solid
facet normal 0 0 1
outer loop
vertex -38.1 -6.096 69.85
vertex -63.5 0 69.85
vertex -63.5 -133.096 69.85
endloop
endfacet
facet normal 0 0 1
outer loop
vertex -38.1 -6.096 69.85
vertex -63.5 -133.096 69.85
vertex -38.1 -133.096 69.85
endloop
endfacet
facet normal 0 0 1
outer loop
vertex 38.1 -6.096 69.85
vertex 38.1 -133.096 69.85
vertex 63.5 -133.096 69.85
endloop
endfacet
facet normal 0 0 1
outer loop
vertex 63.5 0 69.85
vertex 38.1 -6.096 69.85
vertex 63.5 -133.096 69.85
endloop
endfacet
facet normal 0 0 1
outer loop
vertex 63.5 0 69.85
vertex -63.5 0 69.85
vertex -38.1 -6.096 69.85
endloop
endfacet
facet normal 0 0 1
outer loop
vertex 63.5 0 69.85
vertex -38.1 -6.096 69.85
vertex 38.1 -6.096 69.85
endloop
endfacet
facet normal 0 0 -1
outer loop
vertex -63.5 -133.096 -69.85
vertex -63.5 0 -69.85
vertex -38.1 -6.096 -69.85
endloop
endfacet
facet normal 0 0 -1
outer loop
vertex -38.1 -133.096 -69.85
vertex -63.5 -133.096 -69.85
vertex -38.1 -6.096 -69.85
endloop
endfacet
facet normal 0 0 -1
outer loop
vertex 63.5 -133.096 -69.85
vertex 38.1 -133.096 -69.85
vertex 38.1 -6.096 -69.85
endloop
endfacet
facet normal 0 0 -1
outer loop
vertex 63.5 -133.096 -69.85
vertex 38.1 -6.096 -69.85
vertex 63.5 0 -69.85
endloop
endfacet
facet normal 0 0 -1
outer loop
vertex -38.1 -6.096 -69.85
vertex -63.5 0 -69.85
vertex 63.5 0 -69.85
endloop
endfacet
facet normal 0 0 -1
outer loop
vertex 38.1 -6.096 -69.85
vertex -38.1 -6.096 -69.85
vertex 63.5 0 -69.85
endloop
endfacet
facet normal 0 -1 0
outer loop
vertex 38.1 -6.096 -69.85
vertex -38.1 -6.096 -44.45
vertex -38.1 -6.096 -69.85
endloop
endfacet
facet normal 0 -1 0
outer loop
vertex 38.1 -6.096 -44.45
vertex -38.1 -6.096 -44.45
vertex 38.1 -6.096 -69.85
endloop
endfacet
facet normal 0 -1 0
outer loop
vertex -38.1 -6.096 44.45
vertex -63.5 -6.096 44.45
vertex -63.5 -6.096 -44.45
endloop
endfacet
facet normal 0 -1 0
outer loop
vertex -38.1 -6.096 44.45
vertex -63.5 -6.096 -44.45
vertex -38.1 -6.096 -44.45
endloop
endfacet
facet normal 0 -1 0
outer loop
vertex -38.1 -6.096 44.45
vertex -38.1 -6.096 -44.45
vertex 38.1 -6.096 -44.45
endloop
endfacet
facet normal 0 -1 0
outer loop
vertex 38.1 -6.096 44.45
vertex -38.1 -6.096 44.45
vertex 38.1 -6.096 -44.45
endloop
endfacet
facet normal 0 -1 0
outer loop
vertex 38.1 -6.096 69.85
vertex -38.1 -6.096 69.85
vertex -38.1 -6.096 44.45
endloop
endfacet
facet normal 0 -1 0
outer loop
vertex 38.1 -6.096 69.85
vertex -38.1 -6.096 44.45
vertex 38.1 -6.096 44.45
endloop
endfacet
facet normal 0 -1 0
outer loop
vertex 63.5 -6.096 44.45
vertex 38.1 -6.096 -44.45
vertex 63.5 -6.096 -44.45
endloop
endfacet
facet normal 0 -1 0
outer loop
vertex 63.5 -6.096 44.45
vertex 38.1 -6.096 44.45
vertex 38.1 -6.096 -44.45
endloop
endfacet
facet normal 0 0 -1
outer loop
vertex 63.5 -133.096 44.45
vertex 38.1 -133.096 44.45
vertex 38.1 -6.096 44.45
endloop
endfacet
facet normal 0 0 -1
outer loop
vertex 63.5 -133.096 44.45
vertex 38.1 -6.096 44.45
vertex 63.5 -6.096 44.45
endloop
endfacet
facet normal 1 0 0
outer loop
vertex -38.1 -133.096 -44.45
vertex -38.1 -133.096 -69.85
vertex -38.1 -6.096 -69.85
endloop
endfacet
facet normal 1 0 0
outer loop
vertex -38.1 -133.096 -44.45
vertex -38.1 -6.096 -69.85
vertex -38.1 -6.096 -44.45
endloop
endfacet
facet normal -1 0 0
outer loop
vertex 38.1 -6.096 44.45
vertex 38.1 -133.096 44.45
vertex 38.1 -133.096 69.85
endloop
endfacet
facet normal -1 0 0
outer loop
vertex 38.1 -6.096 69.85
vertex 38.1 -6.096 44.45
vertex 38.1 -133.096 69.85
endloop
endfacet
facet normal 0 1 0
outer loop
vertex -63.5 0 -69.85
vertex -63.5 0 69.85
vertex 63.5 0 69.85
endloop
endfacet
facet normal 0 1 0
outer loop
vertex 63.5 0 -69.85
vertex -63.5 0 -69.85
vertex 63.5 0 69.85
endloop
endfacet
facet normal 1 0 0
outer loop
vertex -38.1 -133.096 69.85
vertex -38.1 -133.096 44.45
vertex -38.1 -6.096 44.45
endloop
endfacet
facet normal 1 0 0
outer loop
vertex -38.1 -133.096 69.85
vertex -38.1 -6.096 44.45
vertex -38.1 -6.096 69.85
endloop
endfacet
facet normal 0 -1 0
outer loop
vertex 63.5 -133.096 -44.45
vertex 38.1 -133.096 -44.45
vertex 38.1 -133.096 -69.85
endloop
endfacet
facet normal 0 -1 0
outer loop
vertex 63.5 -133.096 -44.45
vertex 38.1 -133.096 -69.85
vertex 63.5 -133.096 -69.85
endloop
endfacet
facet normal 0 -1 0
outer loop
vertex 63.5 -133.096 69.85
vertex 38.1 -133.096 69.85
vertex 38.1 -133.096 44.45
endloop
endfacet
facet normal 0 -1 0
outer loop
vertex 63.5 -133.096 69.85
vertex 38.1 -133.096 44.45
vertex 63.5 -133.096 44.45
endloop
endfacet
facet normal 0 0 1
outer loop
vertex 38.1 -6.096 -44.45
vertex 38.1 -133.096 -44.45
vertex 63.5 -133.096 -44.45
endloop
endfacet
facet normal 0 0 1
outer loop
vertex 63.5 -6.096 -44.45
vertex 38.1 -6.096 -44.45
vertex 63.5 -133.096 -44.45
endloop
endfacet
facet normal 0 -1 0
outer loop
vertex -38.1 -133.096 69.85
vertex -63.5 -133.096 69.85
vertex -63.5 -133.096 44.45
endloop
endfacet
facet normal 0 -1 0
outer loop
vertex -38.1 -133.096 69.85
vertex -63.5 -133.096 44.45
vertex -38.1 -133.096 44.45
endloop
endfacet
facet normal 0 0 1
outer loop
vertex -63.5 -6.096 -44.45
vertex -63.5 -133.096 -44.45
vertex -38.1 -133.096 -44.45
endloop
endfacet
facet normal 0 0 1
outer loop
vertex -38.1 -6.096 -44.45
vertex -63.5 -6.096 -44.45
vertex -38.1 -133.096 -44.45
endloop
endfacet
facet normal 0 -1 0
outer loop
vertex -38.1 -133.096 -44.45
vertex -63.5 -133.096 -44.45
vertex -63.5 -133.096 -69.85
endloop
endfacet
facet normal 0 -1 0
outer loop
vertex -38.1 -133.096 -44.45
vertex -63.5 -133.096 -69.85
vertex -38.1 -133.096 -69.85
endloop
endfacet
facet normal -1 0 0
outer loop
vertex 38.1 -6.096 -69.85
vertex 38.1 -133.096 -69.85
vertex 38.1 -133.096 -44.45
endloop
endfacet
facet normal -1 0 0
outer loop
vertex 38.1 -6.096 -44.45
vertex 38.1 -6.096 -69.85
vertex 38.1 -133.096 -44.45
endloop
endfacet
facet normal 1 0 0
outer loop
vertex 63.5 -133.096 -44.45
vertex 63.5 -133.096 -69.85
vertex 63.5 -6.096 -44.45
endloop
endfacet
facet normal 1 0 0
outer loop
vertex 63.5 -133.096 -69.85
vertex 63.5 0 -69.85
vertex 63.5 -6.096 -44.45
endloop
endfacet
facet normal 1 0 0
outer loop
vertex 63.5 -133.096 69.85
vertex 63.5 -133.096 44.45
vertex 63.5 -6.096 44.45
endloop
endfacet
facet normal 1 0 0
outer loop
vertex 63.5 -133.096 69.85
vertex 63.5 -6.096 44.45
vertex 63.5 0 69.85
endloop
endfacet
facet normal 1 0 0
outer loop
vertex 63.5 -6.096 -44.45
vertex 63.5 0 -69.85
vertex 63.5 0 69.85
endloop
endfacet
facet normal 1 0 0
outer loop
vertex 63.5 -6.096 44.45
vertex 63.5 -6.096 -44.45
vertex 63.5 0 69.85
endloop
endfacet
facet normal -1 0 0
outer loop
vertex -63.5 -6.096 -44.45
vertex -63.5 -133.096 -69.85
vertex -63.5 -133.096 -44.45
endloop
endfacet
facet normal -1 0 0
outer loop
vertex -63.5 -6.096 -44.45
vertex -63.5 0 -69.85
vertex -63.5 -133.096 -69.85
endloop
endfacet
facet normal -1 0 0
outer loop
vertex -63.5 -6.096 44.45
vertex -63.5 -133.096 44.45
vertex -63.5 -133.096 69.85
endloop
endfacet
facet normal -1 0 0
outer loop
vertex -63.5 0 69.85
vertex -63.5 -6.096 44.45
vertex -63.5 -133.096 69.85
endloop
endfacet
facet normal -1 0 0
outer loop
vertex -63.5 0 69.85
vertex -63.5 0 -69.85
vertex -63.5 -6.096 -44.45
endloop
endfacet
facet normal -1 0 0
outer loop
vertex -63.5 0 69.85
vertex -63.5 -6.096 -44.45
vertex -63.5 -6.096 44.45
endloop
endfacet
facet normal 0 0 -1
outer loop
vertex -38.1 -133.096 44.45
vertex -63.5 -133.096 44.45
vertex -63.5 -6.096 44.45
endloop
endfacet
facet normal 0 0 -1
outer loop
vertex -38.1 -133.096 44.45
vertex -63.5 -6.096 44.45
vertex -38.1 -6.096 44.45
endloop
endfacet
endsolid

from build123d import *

# Parameters (mm, degrees)
F0_W     = 127
F0_H     = 139.7
F1_DEPTH = 6.096
F2_W     = 25.4
F2_H     = 25.4
F3_DEPTH = 127
F4_DEPTH = 127
F5_DEPTH = 127
F6_DEPTH = 127


with BuildPart() as f1:
    # F0 (on Front) → F1 (new body)
    with BuildSketch(Plane.XZ):
        Rectangle(F0_W, F0_H)
    extrude(amount=F1_DEPTH)

    # F2 (on face) → F3 (join)
    with BuildSketch(Plane.XZ.offset(6.096)):
        with Locations((-50.8, 57.15)):
            Rectangle(F2_W, F2_H)
    extrude(amount=F3_DEPTH)

    # F2 (on face) → F4 (join)
    with BuildSketch(Plane.XZ.offset(6.096)):
        with Locations((-50.8, -57.15)):
            Rectangle(F2_W, F2_H)
    extrude(amount=F4_DEPTH)

    # F2 (on face) → F5 (join)
    with BuildSketch(Plane.XZ.offset(6.096)):
        with Locations((50.8, 57.15)):
            Rectangle(F2_W, F2_H)
    extrude(amount=F5_DEPTH)

    # F2 (on face) → F6 (join)
    with BuildSketch(Plane.XZ.offset(6.096)):
        with Locations((50.8, -57.15)):
            Rectangle(F2_W, F2_H)
    extrude(amount=F6_DEPTH)


solid = f1.part
